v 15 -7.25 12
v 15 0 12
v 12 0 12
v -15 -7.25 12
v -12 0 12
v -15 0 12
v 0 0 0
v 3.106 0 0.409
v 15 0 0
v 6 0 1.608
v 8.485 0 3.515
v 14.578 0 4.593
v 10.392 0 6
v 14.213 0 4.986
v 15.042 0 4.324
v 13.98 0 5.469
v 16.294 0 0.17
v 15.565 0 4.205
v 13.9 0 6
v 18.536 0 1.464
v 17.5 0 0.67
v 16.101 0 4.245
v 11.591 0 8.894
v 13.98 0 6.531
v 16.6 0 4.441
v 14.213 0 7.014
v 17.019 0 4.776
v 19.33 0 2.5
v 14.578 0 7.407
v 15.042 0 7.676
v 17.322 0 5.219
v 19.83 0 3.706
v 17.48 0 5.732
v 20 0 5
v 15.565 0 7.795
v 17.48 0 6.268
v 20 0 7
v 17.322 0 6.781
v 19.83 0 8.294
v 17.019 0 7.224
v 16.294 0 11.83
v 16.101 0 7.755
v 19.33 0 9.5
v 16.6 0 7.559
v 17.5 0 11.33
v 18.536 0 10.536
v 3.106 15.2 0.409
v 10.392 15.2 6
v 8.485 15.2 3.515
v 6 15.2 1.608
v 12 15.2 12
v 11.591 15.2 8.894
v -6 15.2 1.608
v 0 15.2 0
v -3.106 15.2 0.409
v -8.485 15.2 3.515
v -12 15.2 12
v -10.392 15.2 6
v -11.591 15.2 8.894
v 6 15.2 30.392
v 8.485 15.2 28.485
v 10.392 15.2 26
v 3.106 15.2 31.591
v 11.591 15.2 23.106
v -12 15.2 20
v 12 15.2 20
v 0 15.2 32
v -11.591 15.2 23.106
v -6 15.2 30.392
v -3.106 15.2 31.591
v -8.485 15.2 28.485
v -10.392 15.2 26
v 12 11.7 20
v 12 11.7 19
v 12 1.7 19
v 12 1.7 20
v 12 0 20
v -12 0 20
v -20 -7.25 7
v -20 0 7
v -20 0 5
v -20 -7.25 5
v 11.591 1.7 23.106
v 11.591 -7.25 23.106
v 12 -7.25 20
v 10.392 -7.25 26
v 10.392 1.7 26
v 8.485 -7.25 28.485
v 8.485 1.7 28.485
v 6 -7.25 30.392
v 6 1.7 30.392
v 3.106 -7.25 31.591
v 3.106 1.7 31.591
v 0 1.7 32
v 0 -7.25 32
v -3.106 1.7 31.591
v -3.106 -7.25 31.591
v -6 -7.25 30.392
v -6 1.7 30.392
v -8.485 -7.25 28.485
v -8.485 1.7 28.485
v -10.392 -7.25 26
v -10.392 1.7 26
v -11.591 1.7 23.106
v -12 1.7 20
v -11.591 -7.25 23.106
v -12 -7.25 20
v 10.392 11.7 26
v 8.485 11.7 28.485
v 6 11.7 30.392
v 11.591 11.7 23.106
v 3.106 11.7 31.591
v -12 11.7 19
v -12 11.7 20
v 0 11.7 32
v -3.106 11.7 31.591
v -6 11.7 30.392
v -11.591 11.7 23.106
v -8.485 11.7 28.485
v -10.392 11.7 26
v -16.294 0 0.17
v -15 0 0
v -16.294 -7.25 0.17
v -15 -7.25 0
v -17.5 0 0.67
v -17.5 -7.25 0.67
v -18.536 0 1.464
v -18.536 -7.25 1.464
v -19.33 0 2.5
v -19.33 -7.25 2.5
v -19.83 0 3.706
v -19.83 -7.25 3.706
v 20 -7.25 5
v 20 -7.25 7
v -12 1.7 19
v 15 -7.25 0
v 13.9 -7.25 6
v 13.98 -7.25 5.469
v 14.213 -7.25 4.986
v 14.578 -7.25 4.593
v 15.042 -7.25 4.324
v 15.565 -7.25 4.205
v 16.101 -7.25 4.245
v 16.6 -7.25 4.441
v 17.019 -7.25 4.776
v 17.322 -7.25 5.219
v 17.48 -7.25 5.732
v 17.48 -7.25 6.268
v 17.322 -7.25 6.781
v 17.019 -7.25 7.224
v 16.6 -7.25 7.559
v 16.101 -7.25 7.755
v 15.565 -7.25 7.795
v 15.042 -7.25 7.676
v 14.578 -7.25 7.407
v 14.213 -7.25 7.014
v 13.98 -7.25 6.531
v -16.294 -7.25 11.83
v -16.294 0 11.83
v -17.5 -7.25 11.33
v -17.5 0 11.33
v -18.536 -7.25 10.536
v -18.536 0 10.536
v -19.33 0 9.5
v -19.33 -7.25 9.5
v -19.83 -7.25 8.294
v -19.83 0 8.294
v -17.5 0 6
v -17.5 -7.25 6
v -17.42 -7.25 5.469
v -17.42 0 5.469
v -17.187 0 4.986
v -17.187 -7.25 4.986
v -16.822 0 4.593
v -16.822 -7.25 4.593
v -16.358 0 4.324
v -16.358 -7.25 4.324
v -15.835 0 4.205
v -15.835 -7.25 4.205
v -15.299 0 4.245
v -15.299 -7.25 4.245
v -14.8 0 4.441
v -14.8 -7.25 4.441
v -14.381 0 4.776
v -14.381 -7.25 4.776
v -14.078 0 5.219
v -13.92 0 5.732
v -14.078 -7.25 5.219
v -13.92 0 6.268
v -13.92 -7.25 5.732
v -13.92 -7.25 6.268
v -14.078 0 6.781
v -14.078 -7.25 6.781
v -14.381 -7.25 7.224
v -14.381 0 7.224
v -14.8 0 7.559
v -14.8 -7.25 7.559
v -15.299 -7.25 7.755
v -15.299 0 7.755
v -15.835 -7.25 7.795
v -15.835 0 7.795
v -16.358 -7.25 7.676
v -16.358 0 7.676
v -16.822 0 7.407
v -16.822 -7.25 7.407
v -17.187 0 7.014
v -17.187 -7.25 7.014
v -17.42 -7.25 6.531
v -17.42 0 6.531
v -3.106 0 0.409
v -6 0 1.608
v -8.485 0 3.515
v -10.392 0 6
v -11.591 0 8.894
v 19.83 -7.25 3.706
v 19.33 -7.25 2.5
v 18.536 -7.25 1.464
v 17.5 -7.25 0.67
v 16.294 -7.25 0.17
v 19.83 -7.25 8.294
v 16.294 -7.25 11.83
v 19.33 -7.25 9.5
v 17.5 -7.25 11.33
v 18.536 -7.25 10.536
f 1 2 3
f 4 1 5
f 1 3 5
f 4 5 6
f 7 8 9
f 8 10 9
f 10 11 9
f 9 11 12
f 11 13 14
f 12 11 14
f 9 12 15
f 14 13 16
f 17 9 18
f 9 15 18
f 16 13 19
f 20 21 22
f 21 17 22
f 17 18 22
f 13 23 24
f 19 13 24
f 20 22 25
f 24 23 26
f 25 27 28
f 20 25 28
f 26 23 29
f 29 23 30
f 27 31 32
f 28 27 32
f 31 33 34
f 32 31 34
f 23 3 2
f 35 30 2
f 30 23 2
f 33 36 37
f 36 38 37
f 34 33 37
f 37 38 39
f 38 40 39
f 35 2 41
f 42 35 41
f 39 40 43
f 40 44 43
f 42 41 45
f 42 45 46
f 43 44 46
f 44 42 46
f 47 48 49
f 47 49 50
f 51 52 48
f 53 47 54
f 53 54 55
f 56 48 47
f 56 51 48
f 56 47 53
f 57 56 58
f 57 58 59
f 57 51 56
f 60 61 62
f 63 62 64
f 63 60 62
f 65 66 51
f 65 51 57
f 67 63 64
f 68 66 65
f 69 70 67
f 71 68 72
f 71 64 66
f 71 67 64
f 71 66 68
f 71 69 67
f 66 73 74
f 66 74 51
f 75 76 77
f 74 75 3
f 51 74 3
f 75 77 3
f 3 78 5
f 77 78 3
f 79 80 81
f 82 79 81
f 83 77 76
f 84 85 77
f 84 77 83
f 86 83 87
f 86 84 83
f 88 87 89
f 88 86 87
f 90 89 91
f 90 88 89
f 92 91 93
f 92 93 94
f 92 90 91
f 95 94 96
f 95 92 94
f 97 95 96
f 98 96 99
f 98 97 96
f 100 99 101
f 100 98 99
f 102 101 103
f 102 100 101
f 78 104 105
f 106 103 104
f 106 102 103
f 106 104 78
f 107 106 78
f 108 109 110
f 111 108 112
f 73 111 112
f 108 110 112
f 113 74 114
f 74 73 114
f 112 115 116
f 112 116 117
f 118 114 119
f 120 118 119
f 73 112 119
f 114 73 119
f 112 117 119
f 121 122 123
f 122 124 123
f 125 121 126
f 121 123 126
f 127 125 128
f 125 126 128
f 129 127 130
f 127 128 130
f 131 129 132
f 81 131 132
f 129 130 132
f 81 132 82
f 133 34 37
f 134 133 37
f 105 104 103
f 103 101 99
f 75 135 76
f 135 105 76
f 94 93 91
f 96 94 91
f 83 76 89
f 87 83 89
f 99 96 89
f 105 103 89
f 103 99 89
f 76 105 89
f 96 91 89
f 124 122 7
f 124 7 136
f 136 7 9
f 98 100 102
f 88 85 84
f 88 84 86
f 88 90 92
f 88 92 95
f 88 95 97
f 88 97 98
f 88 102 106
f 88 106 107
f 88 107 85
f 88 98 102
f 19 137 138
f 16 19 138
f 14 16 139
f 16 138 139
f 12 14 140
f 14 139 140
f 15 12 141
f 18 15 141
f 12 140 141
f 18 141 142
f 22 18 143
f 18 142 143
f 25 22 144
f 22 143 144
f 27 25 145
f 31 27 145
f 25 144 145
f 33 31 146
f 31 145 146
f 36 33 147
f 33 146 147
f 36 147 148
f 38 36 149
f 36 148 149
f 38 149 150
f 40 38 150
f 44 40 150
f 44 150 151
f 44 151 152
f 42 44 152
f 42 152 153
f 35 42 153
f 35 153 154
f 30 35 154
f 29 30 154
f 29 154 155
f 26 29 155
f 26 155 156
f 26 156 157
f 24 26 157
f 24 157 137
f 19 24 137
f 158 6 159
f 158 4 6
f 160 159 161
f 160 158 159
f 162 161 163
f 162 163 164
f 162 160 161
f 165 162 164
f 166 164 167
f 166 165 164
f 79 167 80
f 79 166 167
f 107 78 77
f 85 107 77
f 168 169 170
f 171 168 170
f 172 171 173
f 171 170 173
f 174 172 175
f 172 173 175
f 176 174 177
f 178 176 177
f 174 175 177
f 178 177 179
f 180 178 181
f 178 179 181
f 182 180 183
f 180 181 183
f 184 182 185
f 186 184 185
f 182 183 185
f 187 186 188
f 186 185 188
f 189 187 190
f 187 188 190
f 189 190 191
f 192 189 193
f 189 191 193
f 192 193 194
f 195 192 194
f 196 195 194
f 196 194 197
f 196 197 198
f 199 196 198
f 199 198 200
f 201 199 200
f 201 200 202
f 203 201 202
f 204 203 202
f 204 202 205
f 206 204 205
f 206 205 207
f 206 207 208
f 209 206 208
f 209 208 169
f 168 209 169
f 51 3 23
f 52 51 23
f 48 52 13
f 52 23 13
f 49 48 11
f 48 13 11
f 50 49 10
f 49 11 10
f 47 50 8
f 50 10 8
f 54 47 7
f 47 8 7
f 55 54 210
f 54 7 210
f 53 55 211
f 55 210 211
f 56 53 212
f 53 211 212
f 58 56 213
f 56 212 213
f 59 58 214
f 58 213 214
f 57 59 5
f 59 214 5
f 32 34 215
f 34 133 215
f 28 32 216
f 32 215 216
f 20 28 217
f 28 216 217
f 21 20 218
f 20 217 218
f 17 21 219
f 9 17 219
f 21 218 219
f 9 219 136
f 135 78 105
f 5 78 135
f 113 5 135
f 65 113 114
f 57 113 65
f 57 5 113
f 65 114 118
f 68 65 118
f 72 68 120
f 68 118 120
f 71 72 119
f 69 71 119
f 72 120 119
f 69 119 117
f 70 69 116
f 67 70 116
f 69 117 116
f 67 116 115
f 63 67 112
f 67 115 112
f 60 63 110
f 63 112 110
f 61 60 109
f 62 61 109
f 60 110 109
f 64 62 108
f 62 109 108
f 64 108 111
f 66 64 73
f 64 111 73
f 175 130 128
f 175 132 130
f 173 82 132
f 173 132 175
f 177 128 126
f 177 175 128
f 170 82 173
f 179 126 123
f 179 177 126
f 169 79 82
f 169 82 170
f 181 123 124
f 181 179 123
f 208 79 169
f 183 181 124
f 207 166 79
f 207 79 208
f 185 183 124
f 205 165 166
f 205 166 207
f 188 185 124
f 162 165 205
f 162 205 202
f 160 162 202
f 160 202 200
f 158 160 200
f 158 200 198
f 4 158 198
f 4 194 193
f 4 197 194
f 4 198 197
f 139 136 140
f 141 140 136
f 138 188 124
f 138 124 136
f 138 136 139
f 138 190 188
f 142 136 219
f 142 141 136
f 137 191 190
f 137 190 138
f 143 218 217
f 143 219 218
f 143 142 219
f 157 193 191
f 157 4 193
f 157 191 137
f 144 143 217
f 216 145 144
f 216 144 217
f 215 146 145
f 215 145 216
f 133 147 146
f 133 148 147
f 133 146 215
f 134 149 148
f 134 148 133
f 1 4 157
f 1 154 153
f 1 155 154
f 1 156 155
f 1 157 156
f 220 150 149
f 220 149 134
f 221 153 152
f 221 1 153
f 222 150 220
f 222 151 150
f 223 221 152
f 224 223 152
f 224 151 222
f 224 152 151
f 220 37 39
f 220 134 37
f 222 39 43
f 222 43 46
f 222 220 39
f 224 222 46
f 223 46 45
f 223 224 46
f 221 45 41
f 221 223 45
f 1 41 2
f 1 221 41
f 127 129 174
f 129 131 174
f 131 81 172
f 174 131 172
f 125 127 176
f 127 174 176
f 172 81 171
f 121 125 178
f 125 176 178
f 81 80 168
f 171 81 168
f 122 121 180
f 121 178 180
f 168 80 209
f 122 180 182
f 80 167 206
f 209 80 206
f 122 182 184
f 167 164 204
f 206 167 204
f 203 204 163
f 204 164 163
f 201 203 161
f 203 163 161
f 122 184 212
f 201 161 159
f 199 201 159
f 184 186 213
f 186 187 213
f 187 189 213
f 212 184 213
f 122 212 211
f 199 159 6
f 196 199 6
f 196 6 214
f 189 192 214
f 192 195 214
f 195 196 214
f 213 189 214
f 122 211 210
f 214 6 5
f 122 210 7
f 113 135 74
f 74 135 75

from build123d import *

# Parameters (mm, degrees)
F1_DEPTH  = 7.25
F0_W      = 24
F0_H      = 8
F2_DEPTH  = 1.7
F4_DEPTH  = 10
F6_DEPTH  = 3.5
F7_R      = 5
F9_D      = 3.6
F10_DEPTH = 7


with BuildPart() as f1:
    # F0 (on Front) → F1 (new body)
    with BuildSketch(Plane.XZ):
        with BuildLine():
            Line((20, 12), (12, 12))
            ThreePointArc((12, 12), (8.4852813844, 3.5147186359), (2.86e-08, 0))
            Line((2.86e-08, 0), (20, 0))
            Line((20, 0), (20, 12))
        make_face()
        with BuildLine():
            Line((12, 12), (-12, 12))
            ThreePointArc((-12, 12), (-8.4852813641, 3.5147186156), (2.86e-08, 0))
            ThreePointArc((2.86e-08, 0), (8.4852813844, 3.5147186359), (12, 12))
        make_face()
        with BuildLine():
            Line((-12, 12), (-20, 12))
            Line((-20, 12), (-20, 0))
            Line((-20, 0), (2.86e-08, 0))
            ThreePointArc((2.86e-08, 0), (-8.4852813641, 3.5147186156), (-12, 12))
        make_face()
    extrude(amount=F1_DEPTH)



with BuildPart() as f1b:
    # F0 (on Front) → F1, piece 2 (new body)
    with BuildSketch(Plane.XZ):
        with BuildLine():
            ThreePointArc((12, 20), (0, 32), (-12, 20))
            Line((-12, 20), (12, 20))
        make_face()
    extrude(amount=F1_DEPTH)


with BuildPart() as f1_1:
    add(f1.part)

    add(f1b.part)  # F2 merges F1b
    # F0 (on Front) → F2 (join)
    with BuildSketch(Plane.XZ):
        with BuildLine():
            ThreePointArc((12, 20), (0, 32), (-12, 20))
            Line((-12, 20), (12, 20))
        make_face()
        with Locations((0, 16)):
            Rectangle(F0_W, F0_H)
        with BuildLine():
            Line((12, 12), (-12, 12))
            ThreePointArc((-12, 12), (-8.4852813641, 3.5147186156), (2.86e-08, 0))
            ThreePointArc((2.86e-08, 0), (8.4852813844, 3.5147186359), (12, 12))
        make_face()
    extrude(amount=-F2_DEPTH)

    # F3 (on face) → F4 (join)
    with BuildSketch(Plane(origin=(0, 1.7, 0), x_dir=(-1, 0, 0), z_dir=(0, 1, 0))):
        with BuildLine():
            ThreePointArc((-12, 12), (0, 0), (12, 12))
            Line((12, 12), (-12, 12))
        make_face()
    extrude(amount=F4_DEPTH)

    # F5 (on face) → F6 (join)
    with BuildSketch(Plane(origin=(0, 11.7, 0), x_dir=(-1, 0, 0), z_dir=(0, 1, 0))):
        with BuildLine():
            ThreePointArc((12, 20), (0, 32), (-12, 20))
            Line((-12, 20), (-12, 12))
            ThreePointArc((-12, 12), (0, 0), (12, 12))
            Line((12, 12), (12, 20))
        make_face()
    extrude(amount=F6_DEPTH)

    # F7
    f7_edges = [f1_1.edges().sort_by_distance(p)[0] for p in [
        (-20, -3.625, 12),
        (-20, -3.625, 0),
        (20, -3.625, 12),
        (20, -3.625, 0),
    ]]
    fillet(f7_edges, radius=F7_R)

    # F9 (through all)
    with Locations(Plane(origin=(0, 0, 0), x_dir=(1, 0, 0), z_dir=(0, 1, 0))):
        with Locations((15.7, -6), (-15.7, -6)):
            Hole(F9_D / 2)

    # F10 (add): a face of the model
    f10_faces = [f1_1.faces().sort_by_distance(p)[0] for p in [
        (0, 6.7, 12),
    ]]
    extrude(f10_faces, amount=F10_DEPTH)


solid = f1_1.part
